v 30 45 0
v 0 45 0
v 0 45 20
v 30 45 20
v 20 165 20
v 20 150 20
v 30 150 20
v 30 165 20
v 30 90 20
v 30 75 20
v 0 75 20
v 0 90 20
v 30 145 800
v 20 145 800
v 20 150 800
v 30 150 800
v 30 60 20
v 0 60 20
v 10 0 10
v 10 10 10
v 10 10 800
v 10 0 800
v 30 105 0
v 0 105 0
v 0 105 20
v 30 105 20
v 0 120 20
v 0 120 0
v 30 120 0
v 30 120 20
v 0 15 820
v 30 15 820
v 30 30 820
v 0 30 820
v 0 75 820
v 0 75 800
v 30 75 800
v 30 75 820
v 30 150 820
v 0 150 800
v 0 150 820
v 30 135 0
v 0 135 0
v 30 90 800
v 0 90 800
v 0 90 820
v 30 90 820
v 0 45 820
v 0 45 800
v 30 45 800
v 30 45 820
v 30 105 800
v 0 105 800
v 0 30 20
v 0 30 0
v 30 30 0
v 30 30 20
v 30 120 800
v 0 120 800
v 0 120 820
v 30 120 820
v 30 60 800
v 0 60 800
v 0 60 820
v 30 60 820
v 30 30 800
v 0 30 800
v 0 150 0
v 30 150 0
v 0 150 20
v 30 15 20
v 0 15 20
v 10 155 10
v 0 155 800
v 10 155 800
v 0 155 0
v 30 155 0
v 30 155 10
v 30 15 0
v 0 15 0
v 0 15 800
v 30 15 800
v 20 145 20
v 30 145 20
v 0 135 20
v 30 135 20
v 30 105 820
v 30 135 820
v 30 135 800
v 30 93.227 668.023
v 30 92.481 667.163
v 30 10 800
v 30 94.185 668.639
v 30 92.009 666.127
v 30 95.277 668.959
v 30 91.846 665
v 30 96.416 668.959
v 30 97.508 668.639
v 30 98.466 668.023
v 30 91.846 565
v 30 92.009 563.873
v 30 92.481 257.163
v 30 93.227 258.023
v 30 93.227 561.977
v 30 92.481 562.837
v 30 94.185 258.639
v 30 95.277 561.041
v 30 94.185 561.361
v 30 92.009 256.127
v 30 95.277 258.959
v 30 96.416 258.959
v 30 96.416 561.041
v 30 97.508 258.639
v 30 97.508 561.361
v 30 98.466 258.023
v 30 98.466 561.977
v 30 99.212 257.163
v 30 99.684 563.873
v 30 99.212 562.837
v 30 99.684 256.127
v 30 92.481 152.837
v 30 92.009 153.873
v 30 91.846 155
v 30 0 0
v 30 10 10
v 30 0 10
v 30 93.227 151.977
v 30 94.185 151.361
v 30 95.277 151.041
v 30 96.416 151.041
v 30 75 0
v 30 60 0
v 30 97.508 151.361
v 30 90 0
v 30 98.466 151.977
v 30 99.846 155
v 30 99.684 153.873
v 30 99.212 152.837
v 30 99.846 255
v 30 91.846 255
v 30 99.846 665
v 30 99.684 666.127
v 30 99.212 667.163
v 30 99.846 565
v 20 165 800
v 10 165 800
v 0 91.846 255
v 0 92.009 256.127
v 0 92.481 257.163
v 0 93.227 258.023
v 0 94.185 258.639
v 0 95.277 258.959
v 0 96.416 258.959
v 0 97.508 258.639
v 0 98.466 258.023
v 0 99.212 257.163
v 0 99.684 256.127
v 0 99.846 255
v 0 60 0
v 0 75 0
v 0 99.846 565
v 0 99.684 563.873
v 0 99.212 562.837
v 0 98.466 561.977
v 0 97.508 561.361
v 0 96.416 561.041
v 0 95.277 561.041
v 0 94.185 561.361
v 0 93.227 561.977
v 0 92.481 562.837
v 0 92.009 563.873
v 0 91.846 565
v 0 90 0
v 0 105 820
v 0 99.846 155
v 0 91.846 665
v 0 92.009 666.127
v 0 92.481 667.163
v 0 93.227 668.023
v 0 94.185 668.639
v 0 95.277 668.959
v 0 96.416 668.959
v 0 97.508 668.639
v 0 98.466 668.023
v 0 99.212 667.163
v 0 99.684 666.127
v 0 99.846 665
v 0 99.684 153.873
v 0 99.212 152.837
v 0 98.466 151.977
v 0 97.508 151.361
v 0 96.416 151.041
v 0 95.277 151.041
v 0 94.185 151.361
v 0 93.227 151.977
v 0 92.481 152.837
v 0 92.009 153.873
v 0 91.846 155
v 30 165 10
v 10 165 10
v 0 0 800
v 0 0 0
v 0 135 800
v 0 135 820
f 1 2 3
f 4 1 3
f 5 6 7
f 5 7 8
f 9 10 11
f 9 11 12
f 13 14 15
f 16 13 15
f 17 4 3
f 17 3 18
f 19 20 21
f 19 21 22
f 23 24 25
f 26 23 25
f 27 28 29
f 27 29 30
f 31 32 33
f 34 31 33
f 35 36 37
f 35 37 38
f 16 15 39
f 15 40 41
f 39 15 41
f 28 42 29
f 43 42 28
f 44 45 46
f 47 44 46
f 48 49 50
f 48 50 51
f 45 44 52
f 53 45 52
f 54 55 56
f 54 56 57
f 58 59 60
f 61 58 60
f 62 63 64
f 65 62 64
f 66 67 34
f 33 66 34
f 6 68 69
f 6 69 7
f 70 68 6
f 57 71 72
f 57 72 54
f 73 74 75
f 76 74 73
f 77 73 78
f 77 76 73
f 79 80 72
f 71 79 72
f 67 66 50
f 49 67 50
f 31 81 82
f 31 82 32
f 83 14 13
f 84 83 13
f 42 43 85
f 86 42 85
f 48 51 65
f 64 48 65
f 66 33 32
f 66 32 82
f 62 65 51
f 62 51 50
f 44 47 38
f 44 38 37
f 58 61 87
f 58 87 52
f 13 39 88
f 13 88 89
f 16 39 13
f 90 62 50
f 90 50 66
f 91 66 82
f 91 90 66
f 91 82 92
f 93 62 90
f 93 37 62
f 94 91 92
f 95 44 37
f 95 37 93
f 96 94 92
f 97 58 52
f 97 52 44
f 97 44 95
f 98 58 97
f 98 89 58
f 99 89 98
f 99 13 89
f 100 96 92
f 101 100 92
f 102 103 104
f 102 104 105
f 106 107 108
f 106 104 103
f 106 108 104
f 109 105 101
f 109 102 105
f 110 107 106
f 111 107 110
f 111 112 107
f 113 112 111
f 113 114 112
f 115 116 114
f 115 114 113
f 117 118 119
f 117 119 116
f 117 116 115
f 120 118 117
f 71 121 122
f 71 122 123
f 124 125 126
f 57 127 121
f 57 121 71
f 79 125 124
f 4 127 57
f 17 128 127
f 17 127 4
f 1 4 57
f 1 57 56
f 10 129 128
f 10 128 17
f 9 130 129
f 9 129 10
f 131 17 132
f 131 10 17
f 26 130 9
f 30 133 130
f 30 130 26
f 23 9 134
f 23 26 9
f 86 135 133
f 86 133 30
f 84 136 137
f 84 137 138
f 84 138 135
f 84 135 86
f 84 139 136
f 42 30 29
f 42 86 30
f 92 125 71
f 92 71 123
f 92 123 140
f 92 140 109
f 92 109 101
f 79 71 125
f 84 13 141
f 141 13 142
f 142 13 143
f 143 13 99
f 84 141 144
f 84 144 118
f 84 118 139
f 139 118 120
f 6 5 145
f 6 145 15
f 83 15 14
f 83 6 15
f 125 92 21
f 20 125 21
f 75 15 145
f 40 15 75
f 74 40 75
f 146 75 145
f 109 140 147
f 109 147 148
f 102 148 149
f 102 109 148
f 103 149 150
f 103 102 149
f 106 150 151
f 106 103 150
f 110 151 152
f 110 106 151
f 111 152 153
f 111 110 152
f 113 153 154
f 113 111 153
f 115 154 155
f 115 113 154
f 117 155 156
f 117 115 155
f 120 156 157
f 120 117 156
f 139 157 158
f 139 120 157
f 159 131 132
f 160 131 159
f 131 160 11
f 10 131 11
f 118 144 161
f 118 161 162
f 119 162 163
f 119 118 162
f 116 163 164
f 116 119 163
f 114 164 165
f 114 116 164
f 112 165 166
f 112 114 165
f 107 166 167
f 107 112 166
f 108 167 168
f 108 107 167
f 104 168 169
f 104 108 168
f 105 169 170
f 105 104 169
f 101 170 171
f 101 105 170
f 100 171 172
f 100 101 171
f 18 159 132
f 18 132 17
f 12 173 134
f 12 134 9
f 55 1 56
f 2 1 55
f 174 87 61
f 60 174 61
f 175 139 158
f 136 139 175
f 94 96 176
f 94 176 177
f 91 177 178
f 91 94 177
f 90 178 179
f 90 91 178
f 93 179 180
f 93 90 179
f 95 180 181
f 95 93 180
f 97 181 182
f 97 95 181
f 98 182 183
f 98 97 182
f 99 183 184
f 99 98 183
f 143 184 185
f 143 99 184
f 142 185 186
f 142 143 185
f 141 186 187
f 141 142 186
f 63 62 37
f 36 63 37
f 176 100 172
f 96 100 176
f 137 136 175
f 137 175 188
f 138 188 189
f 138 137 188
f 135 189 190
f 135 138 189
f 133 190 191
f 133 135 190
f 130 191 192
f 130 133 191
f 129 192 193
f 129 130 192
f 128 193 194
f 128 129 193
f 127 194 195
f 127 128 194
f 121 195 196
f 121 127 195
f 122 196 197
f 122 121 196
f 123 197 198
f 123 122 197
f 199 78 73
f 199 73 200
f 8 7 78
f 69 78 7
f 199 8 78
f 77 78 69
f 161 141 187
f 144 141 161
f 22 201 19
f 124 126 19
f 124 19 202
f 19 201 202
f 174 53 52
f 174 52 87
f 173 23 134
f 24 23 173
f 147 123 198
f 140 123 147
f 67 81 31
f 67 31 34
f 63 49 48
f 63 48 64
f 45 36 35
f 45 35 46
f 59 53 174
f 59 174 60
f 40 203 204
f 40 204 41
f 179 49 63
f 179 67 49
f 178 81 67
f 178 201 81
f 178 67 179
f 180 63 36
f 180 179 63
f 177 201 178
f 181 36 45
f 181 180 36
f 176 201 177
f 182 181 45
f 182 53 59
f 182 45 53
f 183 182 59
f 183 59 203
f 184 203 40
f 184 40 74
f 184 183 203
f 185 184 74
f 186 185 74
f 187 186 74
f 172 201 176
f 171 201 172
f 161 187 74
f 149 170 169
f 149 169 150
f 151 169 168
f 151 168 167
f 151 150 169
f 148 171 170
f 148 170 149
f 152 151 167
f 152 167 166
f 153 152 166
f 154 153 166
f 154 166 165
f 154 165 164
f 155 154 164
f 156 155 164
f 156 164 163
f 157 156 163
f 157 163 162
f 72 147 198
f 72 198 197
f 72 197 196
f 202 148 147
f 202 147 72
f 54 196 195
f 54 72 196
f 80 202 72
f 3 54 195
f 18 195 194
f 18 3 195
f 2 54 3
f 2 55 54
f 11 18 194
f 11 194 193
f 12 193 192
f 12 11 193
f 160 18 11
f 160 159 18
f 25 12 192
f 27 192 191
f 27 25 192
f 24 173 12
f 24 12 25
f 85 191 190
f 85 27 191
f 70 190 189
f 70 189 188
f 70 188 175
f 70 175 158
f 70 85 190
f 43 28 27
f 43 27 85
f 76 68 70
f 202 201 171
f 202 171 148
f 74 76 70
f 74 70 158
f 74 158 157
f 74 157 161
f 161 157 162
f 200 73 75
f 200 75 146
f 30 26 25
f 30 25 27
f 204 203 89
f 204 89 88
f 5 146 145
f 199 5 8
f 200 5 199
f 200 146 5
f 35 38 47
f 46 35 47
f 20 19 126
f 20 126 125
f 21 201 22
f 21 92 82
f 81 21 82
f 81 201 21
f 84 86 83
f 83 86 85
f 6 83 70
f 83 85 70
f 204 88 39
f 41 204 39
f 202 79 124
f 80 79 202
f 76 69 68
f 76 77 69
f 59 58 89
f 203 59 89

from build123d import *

# Parameters (mm, degrees)
EXTRUDE_1_DEPTH        = 820
SKETCH_2_W             = 10
SKETCH_2_H             = 10
EXTRUDE_2_DEPTH        = 20
SKETCH_4_W             = 20
SKETCH_4_H             = 20
EXTRUDE_3_DEPTH        = 10
SKETCH_5_W             = 10
SKETCH_5_H             = 10
CUT_EXTRUDE_2_DEPTH    = 837.973715238
CUT_EXTRUDE_3_DEPTH    = 837.973715238
SKETCH_7_W             = 20
SKETCH_7_H             = 15
CUT_EXTRUDE_4_DEPTH    = 837.973715238
PATTERN_LINEAR_1_COUNT = 6
PATTERN_LINEAR_1_PITCH = 30
SKETCH_8_W             = 20
SKETCH_8_H             = 15
CUT_EXTRUDE_5_DEPTH    = 837.973715238
PATTERN_LINEAR_2_COUNT = 5
PATTERN_LINEAR_2_PITCH = 30


with BuildPart() as part:
    # Эскиз1 → Бобышка-Вытянуть1 (new body)
    with BuildSketch(Plane.XY):
        Polygon((0, 0), (0, 155), (10, 155), (10, 165), (20, 165), (20, 145), (30, 145), (30, 10), (10, 10), (10, 0), align=None)
    extrude(amount=EXTRUDE_1_DEPTH)

    # Эскиз2 → Бобышка-Вытянуть2 (add)
    with BuildSketch(Plane(origin=(10, 0, 0), x_dir=(0, 0, -1), z_dir=(1, 0, 0))):
        with Locations((-815, 5)):
            Rectangle(SKETCH_2_W, SKETCH_2_H)
        with Locations((-5, 5)):
            Rectangle(SKETCH_2_W, SKETCH_2_H)
    extrude(amount=EXTRUDE_2_DEPTH)

    # Эскиз4 → Бобышка-Вытянуть3 (add)
    with BuildSketch(Plane(origin=(20, 0, 0), x_dir=(0, 0, -1), z_dir=(1, 0, 0))):
        with Locations((-810, 155)):
            Rectangle(SKETCH_4_W, SKETCH_4_H)
        with Locations((-10, 155)):
            Rectangle(SKETCH_4_W, SKETCH_4_H)
    extrude(amount=EXTRUDE_3_DEPTH)

    # Эскиз5 → Вырез-Вытянуть2 (cut, through all)
    with BuildSketch(Plane(origin=(30, 0, 0), x_dir=(0, 0, -1), z_dir=(1, 0, 0))):
        with Locations((-815, 160)):
            Rectangle(SKETCH_5_W, SKETCH_5_H)
        with Locations((-5, 160)):
            Rectangle(SKETCH_5_W, SKETCH_5_H)
    extrude(amount=-CUT_EXTRUDE_2_DEPTH, mode=Mode.SUBTRACT)

    # Эскиз6 → Вырез-Вытянуть3 (cut, through all)
    with BuildSketch(Plane(origin=(30, 0, 0), x_dir=(0, 0, -1), z_dir=(1, 0, 0))):
        with BuildLine():
            Line((-155, 91.846489001), (-255, 91.846489001))
            ThreePointArc((-255, 91.846489001), (-259, 95.846489001), (-255, 99.846489001))
            Line((-255, 99.846489001), (-155, 99.846489001))
            ThreePointArc((-155, 99.846489001), (-151, 95.846489001), (-155, 91.846489001))
        make_face()
        with BuildLine():
            Line((-665, 99.846489001), (-565, 99.846489001))
            ThreePointArc((-565, 99.846489001), (-561, 95.846489001), (-565, 91.846489001))
            Line((-565, 91.846489001), (-665, 91.846489001))
            ThreePointArc((-665, 91.846489001), (-669, 95.846489001), (-665, 99.846489001))
        make_face()
    extrude(amount=-CUT_EXTRUDE_3_DEPTH, mode=Mode.SUBTRACT)

    # Эскиз7 → Вырез-Вытянуть4 (cut, through all)
    with BuildSketch(Plane.ZY):
        with Locations((810, 7.5)):
            Rectangle(SKETCH_7_W, SKETCH_7_H)
    cut_extrude_4 = extrude(amount=-CUT_EXTRUDE_4_DEPTH, mode=Mode.SUBTRACT)

    # Линейный массив1: Вырез-Вытянуть4 ×6
    with Locations(*[(0, i * PATTERN_LINEAR_1_PITCH, 0) for i in range(1, PATTERN_LINEAR_1_COUNT)]):
        add(cut_extrude_4, mode=Mode.SUBTRACT)

    # Эскиз8 → Вырез-Вытянуть5 (cut, through all)
    with BuildSketch(Plane.ZY):
        with Locations((10, 22.5)):
            Rectangle(SKETCH_8_W, SKETCH_8_H)
    cut_extrude_5 = extrude(amount=-CUT_EXTRUDE_5_DEPTH, mode=Mode.SUBTRACT)

    # Линейный массив2: Вырез-Вытянуть5 ×5
    with Locations(*[(0, i * PATTERN_LINEAR_2_PITCH, 0) for i in range(1, PATTERN_LINEAR_2_COUNT)]):
        add(cut_extrude_5, mode=Mode.SUBTRACT)


solid = part.part
